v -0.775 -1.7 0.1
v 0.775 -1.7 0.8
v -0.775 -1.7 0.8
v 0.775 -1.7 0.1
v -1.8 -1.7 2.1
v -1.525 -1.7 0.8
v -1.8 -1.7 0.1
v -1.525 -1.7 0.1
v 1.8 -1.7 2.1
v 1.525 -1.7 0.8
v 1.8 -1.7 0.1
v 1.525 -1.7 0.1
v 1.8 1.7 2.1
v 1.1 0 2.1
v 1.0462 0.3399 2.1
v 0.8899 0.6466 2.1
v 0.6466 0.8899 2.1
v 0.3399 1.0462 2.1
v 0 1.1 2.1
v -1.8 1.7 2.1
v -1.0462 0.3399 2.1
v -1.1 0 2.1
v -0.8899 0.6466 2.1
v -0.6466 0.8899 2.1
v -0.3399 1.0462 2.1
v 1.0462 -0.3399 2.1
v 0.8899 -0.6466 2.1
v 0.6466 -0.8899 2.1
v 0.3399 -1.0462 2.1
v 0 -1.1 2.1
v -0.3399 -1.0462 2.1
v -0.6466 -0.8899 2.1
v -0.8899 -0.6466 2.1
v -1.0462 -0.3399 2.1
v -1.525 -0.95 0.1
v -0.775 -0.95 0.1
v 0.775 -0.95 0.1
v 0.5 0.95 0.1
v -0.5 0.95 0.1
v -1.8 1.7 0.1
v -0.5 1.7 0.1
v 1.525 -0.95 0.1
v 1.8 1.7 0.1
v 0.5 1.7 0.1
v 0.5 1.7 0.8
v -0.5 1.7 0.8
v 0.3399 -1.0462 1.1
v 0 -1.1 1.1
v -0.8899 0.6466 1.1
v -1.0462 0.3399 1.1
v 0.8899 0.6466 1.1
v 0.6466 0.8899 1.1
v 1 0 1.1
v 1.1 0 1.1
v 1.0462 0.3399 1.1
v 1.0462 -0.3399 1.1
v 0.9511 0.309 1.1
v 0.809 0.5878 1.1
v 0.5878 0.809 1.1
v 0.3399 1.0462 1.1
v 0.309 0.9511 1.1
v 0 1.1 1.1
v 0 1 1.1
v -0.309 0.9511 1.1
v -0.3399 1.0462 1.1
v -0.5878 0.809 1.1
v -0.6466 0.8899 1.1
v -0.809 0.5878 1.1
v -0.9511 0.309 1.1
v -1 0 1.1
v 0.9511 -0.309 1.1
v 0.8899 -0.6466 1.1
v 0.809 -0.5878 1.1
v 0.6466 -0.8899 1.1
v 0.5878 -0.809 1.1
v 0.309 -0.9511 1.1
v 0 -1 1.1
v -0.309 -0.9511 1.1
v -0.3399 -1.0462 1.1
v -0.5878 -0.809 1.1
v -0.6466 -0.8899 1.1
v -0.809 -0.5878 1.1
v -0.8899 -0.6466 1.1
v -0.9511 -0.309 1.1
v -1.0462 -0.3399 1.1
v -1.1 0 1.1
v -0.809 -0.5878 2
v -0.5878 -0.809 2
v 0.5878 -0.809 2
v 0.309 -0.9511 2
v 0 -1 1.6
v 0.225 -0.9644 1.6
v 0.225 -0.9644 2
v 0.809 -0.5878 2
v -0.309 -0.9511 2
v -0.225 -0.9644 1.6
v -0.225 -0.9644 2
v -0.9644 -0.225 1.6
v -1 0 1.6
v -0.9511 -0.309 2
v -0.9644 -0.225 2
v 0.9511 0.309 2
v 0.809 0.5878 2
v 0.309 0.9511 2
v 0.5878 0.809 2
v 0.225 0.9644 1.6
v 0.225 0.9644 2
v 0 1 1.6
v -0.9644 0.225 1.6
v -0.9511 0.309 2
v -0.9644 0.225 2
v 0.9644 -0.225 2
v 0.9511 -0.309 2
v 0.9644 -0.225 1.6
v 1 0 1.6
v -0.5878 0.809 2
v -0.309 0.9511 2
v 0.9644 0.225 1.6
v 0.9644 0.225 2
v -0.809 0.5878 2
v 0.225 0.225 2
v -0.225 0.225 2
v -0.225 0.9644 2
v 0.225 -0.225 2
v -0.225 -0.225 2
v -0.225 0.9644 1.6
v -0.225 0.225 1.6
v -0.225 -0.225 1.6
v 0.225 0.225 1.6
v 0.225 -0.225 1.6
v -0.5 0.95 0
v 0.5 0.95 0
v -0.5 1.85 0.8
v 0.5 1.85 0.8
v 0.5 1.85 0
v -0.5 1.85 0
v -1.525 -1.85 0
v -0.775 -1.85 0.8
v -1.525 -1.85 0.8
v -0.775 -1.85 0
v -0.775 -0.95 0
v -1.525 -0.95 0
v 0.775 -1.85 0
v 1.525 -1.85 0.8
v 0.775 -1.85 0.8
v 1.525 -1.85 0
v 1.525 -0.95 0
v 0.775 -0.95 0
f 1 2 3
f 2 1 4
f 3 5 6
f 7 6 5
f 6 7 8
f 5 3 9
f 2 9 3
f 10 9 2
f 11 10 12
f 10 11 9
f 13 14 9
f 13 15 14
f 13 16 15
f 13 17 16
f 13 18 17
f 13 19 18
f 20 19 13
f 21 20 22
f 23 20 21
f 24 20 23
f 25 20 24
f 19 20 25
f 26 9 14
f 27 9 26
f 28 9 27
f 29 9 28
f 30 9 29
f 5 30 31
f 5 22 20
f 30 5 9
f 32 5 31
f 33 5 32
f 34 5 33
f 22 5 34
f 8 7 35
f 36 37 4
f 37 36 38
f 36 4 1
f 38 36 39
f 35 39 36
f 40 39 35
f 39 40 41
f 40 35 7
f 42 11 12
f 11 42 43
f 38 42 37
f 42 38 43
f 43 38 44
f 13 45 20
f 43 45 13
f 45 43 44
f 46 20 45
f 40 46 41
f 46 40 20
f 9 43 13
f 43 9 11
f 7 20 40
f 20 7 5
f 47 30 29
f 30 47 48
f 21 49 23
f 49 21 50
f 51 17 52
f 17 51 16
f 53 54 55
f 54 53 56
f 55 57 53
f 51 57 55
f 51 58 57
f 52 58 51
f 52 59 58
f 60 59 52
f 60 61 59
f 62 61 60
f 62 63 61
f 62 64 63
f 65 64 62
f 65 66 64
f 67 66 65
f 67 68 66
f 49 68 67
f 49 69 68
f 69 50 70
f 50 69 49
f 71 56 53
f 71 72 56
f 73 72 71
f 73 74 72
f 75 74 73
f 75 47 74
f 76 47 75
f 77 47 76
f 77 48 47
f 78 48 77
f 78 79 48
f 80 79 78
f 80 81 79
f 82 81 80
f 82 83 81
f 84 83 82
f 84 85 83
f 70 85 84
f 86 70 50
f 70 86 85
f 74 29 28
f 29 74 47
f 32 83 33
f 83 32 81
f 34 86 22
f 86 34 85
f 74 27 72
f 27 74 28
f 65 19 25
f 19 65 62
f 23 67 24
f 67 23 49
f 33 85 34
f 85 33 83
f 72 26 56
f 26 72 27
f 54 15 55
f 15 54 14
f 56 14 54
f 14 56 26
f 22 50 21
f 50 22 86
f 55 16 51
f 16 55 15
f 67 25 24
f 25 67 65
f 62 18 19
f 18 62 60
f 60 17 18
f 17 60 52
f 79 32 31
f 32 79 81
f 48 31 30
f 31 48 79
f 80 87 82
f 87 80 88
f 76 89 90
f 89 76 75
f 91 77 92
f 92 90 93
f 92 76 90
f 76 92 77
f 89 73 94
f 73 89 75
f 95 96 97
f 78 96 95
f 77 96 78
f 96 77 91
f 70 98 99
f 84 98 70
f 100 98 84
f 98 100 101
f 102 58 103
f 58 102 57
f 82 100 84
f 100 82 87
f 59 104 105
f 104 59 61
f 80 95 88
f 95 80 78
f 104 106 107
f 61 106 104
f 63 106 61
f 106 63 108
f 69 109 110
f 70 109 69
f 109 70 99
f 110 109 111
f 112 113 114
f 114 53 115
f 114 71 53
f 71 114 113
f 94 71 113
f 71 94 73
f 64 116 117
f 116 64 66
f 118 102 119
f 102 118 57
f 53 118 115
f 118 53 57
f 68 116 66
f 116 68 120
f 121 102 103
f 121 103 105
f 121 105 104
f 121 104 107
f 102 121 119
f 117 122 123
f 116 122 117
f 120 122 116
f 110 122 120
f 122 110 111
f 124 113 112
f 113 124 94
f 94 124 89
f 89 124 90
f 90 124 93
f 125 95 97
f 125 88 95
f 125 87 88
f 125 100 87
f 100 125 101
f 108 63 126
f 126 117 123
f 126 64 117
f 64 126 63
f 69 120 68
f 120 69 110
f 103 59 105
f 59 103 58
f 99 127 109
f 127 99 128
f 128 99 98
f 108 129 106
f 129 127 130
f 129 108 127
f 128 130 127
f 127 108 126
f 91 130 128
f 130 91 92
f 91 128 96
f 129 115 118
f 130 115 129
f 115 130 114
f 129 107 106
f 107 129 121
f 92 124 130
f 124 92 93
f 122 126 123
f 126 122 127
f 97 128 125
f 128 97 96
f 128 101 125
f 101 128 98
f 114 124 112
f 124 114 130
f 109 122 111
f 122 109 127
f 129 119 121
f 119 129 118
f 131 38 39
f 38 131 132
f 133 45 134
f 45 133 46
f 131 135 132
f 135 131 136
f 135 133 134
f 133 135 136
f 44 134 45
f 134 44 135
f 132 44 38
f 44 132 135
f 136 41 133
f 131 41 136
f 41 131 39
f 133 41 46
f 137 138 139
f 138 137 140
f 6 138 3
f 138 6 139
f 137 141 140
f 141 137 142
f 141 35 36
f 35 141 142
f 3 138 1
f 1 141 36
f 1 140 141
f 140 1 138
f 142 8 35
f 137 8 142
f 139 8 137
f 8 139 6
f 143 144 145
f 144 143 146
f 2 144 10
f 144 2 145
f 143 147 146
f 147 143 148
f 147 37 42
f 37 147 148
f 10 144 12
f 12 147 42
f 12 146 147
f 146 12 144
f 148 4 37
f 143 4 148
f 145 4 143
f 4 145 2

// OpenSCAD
rotate([0,0,-90]){
difference(){
translate([-3.4/2,-3.6/2,0.1])color("grey")cube([3.4,3.6,2.0]);
translate([0,0,1.1])color("grey")cylinder(r=1.1,h=1.1,$fn=20);
}
difference(){
translate([0,0,1])color("white")cylinder(r=1,h=1,$fn=20);
translate([-1,-0.45/2,1.6])color("white")cube([2,0.45,0.41]);
translate([-0.45/2,-1,1.6])color("white")cube([0.45,2,,0.41]);
}

translate([-3.4/2+0.3-0.9/2,-0.5,0])color("silver")cube([0.9,1,0.8]);
translate([-3.4/2+0.3-0.9/2,-0.75/2,0])color("silver")cube([0.9,0.75,0.8]);
translate([3.4/2-0.3-0.9/2,-1.15-0.75/2,0])color("silver")cube([0.9,0.75,0.8]);
translate([3.4/2-0.3-0.9/2,+1.15-0.75/2,0])color("silver")cube([0.9,0.75,0.8]);
}
